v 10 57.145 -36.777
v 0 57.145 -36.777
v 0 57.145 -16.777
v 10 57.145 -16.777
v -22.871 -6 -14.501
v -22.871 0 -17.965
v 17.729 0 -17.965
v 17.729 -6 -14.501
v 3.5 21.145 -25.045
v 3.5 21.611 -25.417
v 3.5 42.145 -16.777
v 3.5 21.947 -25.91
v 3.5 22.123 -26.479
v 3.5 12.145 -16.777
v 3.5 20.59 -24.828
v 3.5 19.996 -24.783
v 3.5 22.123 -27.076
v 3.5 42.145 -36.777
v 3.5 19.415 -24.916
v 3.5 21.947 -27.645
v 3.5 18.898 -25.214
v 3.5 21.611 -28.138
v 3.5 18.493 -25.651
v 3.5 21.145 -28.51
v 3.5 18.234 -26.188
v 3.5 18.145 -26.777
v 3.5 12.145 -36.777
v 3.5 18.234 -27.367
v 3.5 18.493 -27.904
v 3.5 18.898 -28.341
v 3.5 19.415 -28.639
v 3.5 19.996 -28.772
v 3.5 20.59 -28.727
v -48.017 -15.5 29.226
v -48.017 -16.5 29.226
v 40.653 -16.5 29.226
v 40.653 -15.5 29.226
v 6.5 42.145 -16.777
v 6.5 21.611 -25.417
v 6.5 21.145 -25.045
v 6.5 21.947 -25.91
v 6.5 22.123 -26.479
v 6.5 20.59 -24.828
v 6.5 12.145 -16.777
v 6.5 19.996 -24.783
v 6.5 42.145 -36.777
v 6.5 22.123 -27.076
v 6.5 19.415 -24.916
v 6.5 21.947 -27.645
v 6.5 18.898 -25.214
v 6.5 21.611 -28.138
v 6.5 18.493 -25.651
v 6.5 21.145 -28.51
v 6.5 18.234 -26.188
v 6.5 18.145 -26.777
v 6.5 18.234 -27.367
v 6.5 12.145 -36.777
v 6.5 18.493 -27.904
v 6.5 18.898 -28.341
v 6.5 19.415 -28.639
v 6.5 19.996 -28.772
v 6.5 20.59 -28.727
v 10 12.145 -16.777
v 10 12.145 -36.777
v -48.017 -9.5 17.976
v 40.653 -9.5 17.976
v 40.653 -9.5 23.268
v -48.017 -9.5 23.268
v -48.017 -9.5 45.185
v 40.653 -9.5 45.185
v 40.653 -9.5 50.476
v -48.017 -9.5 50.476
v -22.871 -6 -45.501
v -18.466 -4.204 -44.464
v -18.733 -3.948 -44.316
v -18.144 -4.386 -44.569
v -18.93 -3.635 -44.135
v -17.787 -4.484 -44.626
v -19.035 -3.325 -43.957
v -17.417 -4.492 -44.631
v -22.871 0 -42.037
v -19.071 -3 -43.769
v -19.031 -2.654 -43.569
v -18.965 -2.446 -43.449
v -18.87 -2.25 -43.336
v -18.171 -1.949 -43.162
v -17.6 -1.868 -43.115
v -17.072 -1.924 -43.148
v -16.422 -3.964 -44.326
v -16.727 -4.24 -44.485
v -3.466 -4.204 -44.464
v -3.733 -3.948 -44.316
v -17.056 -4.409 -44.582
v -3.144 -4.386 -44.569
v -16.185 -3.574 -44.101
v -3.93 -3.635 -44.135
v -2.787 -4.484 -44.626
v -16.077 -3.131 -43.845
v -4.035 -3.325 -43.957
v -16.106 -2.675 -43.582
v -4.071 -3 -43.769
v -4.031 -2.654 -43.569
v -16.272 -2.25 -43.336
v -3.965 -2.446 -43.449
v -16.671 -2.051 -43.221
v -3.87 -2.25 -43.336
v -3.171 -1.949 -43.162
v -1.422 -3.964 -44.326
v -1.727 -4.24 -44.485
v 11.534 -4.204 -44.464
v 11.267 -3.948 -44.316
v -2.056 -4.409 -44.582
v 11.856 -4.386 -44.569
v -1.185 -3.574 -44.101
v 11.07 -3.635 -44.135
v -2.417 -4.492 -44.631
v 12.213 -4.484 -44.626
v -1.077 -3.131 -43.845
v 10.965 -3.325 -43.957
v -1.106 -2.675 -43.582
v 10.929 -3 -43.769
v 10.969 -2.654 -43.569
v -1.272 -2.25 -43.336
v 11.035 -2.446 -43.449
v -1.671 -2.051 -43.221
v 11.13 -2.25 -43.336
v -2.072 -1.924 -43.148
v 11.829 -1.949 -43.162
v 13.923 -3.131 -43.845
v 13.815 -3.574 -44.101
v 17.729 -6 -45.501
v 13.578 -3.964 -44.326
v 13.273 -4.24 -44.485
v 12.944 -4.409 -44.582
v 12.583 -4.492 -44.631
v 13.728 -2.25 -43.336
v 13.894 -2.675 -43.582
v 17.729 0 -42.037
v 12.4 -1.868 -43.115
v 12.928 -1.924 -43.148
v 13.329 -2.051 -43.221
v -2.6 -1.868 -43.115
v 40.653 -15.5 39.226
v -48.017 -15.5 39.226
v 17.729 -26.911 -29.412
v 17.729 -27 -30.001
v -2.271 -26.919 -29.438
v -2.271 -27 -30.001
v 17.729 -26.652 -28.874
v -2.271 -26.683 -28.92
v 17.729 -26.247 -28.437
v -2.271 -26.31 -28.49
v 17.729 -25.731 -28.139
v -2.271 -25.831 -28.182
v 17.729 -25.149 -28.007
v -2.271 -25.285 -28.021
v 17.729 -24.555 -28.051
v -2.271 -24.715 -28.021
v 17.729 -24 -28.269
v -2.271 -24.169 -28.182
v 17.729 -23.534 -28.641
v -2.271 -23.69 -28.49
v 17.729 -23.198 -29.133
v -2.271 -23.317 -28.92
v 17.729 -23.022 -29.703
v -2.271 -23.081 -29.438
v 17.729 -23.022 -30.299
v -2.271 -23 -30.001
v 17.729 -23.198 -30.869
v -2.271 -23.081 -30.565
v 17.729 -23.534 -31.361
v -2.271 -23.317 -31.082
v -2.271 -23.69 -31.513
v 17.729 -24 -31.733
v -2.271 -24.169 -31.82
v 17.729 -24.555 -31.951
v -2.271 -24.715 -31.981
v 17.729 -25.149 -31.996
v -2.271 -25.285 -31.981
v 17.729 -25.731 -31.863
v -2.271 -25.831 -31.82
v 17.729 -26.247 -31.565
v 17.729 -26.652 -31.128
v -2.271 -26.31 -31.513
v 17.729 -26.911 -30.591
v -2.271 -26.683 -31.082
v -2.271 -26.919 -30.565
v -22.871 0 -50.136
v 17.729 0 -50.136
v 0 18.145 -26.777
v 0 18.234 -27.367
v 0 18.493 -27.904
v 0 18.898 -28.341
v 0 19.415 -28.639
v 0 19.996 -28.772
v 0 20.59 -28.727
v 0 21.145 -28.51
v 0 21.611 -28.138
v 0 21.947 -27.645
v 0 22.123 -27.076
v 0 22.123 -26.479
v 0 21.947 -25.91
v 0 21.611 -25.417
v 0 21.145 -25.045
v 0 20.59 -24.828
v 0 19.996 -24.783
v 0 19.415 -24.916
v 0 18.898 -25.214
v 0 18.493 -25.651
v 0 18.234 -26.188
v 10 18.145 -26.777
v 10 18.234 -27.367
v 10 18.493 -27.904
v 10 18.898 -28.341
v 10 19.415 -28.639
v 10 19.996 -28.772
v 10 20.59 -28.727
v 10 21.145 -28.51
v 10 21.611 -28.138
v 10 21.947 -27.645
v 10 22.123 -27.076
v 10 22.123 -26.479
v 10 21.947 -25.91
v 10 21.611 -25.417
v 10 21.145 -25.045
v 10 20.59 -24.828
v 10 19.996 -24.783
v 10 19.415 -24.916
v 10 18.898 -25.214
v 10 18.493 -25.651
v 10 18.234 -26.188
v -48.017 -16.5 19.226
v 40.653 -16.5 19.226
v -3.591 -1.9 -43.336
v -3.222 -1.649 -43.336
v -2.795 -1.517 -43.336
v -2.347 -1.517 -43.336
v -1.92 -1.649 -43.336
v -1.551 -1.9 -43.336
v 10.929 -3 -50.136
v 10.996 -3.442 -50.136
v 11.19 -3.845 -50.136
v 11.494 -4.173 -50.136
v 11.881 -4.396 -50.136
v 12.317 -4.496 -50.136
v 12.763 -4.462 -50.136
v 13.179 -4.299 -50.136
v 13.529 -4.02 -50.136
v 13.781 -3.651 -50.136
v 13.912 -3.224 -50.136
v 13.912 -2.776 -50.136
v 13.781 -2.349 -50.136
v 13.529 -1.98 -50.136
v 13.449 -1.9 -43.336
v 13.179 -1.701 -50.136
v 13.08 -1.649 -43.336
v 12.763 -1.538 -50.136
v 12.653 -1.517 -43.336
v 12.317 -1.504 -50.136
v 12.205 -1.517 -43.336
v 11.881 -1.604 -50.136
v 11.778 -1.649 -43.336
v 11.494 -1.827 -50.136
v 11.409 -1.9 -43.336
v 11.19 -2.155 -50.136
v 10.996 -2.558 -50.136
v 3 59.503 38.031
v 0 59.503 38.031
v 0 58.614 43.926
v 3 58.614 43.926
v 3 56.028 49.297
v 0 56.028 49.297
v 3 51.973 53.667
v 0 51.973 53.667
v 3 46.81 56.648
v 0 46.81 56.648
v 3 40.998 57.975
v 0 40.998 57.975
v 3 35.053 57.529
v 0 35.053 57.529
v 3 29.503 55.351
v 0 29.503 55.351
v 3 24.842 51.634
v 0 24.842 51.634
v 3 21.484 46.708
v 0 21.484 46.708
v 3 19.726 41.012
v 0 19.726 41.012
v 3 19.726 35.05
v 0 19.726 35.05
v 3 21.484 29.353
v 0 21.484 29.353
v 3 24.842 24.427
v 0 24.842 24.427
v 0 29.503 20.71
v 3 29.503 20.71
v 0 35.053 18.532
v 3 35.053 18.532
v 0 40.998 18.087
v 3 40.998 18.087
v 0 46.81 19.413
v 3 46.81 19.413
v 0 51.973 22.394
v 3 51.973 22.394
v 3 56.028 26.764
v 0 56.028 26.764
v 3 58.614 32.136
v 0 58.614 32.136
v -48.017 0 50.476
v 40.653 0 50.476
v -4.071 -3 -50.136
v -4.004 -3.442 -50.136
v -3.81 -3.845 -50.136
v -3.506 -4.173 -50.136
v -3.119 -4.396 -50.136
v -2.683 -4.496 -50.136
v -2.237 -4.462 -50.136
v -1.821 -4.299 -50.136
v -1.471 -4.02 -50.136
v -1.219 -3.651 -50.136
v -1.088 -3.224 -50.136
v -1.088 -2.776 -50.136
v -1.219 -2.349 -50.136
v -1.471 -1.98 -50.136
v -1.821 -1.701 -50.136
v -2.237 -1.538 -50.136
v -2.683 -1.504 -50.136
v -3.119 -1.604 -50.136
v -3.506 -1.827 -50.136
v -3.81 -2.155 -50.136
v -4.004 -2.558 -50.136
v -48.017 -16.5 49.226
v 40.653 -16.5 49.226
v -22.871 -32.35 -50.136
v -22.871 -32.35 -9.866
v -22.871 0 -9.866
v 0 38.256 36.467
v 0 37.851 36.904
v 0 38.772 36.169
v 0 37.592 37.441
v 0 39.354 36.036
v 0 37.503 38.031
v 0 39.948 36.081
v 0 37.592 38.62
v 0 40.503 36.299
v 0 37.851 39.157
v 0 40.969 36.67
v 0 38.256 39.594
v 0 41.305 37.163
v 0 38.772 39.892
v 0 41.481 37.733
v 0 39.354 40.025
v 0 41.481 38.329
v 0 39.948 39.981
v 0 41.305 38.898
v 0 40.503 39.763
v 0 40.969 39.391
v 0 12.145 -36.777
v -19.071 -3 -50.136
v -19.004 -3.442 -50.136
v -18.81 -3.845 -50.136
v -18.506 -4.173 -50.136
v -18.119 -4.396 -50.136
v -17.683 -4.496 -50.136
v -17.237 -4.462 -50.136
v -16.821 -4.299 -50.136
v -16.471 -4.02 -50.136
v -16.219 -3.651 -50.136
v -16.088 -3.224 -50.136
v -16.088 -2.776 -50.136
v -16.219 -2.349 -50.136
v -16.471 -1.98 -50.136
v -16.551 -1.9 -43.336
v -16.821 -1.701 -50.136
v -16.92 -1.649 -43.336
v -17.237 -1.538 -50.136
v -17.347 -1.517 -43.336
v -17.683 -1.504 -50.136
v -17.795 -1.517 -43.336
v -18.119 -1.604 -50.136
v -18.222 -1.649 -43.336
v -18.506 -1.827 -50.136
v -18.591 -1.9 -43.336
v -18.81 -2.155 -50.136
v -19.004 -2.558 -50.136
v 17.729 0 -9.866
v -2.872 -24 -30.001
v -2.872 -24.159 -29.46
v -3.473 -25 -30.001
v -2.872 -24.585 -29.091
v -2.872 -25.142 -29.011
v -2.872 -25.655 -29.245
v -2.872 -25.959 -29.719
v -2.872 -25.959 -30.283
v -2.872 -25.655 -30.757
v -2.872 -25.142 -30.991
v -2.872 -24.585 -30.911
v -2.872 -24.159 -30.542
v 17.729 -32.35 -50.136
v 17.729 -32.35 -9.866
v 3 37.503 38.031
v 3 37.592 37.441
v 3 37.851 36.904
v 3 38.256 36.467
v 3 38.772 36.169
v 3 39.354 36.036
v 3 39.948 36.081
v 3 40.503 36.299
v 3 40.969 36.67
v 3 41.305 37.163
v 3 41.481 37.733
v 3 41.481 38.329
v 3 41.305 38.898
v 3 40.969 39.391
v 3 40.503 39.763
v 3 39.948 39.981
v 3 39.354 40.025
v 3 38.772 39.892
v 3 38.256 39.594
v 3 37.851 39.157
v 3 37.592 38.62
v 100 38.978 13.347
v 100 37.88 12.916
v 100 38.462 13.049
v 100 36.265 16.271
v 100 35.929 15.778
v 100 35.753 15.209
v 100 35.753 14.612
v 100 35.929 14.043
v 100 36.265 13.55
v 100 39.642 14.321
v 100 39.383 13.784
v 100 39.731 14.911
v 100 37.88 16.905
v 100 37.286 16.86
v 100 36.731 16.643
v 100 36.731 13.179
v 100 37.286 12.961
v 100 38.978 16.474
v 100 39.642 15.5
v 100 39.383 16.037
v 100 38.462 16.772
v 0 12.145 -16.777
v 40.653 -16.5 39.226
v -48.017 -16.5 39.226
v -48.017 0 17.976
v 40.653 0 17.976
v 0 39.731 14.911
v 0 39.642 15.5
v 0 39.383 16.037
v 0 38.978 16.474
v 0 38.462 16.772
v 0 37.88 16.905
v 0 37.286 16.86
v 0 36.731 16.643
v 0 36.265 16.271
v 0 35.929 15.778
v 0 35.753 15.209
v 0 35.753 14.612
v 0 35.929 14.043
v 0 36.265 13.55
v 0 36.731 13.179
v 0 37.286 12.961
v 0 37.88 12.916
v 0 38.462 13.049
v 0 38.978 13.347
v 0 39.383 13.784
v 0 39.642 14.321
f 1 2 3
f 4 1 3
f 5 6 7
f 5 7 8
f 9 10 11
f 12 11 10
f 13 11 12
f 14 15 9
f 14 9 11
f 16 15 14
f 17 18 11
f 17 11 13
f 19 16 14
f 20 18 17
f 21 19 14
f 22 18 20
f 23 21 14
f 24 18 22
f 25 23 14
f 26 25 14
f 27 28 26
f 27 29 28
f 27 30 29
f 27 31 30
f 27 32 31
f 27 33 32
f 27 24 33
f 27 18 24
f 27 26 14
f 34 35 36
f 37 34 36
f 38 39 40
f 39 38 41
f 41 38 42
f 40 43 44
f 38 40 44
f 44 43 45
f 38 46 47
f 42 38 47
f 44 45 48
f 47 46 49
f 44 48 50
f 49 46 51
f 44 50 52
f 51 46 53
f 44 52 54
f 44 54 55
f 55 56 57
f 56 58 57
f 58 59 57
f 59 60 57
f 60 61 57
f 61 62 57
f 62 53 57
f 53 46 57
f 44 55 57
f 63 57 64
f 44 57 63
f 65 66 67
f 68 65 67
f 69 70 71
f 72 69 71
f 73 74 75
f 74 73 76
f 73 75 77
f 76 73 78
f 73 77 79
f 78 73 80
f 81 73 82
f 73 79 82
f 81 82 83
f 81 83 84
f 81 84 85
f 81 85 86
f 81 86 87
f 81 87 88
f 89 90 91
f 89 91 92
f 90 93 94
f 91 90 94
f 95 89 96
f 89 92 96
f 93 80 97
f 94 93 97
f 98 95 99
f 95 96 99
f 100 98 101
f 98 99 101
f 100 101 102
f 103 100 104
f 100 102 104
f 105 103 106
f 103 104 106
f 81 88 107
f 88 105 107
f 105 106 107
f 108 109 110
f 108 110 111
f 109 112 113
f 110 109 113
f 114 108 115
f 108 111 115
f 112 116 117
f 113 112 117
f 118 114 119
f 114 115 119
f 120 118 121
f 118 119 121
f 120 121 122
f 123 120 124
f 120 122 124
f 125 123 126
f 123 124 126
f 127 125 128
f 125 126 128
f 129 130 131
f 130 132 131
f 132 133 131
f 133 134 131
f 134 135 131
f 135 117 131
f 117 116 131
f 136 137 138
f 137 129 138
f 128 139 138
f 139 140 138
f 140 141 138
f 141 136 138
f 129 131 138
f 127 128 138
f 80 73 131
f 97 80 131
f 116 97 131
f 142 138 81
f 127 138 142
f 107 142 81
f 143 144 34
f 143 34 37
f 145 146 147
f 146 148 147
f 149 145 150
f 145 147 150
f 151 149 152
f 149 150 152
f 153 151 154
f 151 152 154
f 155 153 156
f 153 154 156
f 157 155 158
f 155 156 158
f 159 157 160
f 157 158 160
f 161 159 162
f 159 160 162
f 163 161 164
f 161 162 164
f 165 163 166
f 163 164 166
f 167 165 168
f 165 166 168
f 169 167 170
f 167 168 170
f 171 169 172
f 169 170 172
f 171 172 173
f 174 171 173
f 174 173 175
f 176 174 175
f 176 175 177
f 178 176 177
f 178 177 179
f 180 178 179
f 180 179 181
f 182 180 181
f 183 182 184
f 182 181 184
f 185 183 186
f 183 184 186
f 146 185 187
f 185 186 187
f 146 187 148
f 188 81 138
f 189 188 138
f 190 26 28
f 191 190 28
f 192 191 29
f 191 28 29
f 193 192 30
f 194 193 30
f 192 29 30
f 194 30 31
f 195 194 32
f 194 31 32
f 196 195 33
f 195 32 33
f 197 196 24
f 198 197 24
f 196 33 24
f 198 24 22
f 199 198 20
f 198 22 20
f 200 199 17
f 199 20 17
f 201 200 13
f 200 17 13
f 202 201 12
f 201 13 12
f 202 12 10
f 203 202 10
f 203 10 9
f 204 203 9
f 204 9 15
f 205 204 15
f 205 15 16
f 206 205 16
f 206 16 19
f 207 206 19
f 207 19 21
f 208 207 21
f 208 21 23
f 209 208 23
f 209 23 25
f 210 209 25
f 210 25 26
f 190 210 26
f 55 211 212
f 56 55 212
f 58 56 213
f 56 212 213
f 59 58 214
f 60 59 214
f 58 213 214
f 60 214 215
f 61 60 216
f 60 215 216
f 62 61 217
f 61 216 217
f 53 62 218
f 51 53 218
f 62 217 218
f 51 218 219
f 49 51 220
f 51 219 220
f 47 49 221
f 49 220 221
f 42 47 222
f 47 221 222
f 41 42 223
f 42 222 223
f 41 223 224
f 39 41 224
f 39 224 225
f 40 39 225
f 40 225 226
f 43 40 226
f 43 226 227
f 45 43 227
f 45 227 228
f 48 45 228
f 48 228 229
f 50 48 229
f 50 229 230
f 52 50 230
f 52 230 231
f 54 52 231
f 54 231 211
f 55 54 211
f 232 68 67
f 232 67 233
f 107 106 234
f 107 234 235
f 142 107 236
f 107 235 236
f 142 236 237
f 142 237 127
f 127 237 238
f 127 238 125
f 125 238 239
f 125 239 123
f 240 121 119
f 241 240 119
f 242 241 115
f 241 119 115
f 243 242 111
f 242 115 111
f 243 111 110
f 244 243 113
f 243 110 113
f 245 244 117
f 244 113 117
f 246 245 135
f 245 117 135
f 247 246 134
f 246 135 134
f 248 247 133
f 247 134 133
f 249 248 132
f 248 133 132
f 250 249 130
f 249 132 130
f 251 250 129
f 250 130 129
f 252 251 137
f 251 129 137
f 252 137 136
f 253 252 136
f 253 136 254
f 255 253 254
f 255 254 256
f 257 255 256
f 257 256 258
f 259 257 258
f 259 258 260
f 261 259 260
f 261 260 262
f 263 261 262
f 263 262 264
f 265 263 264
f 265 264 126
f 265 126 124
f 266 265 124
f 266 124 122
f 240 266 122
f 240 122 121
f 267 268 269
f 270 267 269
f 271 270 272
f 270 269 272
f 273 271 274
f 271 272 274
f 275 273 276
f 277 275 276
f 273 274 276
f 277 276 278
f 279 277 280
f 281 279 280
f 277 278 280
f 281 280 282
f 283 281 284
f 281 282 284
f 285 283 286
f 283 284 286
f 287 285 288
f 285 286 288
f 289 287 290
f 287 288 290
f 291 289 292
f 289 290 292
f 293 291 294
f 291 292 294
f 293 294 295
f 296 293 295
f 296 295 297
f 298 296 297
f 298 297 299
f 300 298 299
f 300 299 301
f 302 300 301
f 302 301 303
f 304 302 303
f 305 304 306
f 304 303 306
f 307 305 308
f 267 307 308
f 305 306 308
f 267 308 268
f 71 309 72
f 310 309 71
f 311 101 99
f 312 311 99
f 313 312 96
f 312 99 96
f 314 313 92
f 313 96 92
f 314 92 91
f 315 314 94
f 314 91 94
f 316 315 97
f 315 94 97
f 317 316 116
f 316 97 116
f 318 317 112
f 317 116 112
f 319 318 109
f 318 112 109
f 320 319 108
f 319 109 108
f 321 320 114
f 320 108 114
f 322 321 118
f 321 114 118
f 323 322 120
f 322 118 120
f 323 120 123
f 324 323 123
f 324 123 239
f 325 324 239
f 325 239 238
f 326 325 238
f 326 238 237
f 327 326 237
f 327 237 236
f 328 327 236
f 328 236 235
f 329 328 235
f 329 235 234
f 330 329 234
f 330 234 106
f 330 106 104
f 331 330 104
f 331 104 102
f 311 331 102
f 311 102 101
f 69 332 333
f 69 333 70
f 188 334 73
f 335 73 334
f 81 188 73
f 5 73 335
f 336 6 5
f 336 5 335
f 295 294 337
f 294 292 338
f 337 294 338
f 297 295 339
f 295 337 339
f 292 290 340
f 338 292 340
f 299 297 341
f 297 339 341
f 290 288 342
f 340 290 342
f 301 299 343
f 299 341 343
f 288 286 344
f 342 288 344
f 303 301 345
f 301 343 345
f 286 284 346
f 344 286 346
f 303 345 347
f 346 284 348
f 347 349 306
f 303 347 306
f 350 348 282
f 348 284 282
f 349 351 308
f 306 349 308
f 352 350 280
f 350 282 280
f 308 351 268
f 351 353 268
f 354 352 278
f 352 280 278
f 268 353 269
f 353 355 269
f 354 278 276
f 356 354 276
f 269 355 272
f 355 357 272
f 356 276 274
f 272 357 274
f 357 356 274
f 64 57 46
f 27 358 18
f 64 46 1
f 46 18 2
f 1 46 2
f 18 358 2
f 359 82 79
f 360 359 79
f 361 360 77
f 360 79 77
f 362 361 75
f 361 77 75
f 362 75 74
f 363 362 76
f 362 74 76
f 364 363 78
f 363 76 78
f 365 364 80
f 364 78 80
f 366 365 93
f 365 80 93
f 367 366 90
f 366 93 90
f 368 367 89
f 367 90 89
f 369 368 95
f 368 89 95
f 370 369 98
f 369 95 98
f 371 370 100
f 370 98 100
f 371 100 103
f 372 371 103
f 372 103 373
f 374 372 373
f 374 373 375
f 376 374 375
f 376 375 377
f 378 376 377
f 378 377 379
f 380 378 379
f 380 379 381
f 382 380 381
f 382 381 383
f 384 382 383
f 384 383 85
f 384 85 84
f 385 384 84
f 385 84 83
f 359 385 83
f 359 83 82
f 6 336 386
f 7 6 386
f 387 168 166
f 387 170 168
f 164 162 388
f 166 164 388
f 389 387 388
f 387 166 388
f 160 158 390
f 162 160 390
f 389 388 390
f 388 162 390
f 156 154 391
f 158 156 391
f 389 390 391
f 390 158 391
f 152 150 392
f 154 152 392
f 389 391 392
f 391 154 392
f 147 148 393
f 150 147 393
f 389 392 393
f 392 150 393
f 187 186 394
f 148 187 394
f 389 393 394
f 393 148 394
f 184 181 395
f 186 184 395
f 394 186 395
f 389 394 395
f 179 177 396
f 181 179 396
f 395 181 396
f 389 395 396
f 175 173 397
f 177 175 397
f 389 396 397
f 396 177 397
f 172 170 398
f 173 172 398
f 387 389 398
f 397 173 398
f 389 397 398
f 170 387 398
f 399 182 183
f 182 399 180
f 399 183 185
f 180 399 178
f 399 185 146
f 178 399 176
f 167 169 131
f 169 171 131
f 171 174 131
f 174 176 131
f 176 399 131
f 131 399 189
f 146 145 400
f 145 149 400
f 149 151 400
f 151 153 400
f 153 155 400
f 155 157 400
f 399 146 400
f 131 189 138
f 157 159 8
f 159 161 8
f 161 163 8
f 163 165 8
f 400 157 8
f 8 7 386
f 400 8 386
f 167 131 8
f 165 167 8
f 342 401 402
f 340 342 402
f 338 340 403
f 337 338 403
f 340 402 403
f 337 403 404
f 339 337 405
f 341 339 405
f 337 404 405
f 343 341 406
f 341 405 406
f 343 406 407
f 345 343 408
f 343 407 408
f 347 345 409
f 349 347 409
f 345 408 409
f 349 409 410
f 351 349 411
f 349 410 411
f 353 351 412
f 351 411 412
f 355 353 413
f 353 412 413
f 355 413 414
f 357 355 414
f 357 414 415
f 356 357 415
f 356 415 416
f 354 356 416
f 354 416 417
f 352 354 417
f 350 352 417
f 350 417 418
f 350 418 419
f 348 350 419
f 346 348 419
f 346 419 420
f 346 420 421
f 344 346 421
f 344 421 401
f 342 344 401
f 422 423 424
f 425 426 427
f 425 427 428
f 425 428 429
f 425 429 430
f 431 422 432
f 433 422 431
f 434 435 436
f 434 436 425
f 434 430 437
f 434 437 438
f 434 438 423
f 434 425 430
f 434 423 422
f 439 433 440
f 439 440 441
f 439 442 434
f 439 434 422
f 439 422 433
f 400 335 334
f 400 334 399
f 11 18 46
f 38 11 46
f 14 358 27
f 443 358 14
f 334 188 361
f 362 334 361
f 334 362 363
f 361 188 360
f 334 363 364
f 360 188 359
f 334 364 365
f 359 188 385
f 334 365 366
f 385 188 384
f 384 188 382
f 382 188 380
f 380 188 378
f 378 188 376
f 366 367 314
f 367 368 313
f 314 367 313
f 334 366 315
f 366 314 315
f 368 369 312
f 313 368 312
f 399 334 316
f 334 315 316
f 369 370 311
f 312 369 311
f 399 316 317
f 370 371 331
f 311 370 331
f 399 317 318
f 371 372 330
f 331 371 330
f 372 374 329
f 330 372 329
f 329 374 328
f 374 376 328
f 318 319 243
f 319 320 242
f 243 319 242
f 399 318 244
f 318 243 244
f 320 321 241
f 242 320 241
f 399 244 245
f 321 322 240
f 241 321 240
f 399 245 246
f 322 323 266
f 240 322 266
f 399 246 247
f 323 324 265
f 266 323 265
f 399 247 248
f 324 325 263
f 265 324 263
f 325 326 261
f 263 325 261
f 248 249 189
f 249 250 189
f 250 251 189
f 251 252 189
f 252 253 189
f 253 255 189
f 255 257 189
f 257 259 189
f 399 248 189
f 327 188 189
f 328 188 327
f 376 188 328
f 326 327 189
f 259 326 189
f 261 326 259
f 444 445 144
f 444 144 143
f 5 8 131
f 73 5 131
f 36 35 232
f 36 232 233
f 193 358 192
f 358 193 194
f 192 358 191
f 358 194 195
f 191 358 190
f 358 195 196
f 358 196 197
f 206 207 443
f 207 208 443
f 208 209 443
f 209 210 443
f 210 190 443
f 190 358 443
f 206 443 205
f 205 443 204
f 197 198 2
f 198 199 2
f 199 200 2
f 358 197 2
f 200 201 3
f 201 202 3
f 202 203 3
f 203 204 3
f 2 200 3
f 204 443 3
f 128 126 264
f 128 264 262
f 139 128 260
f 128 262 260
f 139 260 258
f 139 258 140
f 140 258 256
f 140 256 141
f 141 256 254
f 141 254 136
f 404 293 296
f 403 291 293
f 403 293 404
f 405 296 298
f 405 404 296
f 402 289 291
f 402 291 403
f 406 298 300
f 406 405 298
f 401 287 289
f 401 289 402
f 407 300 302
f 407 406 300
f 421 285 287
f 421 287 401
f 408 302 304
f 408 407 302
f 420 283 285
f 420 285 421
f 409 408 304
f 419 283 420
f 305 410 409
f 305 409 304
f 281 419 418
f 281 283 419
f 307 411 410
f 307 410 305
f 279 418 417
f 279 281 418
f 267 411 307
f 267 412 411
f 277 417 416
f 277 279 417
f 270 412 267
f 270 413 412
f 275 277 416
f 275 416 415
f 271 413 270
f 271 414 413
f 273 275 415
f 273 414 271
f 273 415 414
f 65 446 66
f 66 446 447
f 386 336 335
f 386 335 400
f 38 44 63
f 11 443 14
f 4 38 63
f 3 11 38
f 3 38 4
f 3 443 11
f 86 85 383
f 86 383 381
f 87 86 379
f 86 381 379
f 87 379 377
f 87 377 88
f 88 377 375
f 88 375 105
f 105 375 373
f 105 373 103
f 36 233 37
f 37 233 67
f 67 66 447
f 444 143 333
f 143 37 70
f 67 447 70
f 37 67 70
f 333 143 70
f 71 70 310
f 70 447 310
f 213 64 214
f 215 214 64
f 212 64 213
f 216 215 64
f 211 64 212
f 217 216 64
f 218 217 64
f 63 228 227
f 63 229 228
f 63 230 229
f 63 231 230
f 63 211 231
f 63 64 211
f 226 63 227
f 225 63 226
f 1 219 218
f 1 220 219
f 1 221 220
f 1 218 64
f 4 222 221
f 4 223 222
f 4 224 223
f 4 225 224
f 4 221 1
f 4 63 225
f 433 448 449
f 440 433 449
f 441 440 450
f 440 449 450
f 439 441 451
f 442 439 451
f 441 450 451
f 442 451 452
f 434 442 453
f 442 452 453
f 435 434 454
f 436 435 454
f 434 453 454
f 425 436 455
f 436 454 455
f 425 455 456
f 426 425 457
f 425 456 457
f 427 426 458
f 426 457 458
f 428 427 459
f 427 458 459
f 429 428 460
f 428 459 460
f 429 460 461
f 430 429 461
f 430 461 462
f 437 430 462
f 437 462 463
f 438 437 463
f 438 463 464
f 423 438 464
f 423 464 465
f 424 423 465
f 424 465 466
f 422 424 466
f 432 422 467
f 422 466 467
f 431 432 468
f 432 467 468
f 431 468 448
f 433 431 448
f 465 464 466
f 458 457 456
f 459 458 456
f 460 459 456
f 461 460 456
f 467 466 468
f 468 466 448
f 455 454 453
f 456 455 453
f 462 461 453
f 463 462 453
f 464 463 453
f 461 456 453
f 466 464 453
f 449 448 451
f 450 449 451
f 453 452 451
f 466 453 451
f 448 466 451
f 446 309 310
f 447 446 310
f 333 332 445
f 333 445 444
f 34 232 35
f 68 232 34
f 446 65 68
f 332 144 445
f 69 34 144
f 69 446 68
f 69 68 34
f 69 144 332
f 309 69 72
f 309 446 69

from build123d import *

# Parameters (mm, degrees)
F0_W      = 88.67
F0_H      = 32.5
F1_DEPTH  = 16.5
F2_W      = 40.6
F2_H      = 40.27
F3_DEPTH  = 32.35
F5_DEPTH  = 40.6
F7_DEPTH  = 88.67
F8_W      = 88.67
F8_H      = 10
F9_DEPTH  = 1
F11_D     = 3
F11_DEPTH = 6.8
F11_TIP   = 0.9012909285
F12_D     = 4
F12_DEPTH = 20
F12_TIP   = 1.2017212381
F13_W     = 45
F13_H     = 20
F14_DEPTH = 10
F15_W     = 3
F15_H     = 30
F16_DEPTH = 20
F17_D     = 4
F18_R     = 2
F19_DEPTH = 100
F20_R     = 20
F21_DEPTH = 3
F22_D     = 4


with BuildPart() as f1:
    # F0 (on Front) → F1 (new body)
    with BuildSketch(Plane.XZ):
        with Locations((-3.6818569219, 34.2264404893)):
            Rectangle(F0_W, F0_H)
    extrude(amount=F1_DEPTH)

    # F6 (on face) → F7 (cut, through all)
    with BuildSketch(Plane.YZ.offset(40.6531430781)):
        Polygon((-16.5, 50.4764404893), (-16.5, 49.2264404893), (-9.5, 45.184988605), (-9.5, 50.4764404893), align=None)
        Polygon((-9.5, 23.2678923736), (-16.5, 19.2264404893), (-16.5, 17.9764404893), (-9.5, 17.9764404893), align=None)
    extrude(amount=-F7_DEPTH, mode=Mode.SUBTRACT)

    # F8 (on face) → F9 (cut)
    with BuildSketch(Plane.XZ.offset(16.5)):
        with Locations((-3.6818569219, 34.2264404893)):
            Rectangle(F8_W, F8_H)
    extrude(amount=-F9_DEPTH, mode=Mode.SUBTRACT)


with BuildPart() as f3:
    # F2 (on Front) → F3 (new body)
    with BuildSketch(Plane.XZ):
        with Locations((-2.5709411383, -30.0011265779)):
            Rectangle(F2_W, F2_H)
    extrude(amount=F3_DEPTH)

    # F4 (on face) → F5 (cut, through all)
    with BuildSketch(Plane.YZ.offset(17.7290588617)):
        Polygon((0, -42.0370249627), (0, -17.965228193), (-6, -14.5011265779), (-6, -45.5011265779), align=None)
    extrude(amount=-F5_DEPTH, mode=Mode.SUBTRACT)

    # F11
    with Locations(Plane(origin=(0, 0, -50.1361265779), x_dir=(1, 0, 0), z_dir=(0, 0, -1))):
        with Locations((-2.5709411383, 3), (12.4290588617, 3), (-17.5709411383, 3)):
            Hole(F11_D / 2, depth=F11_DEPTH)
            with Locations((0, 0, -(F11_DEPTH + F11_TIP / 2))):  # 118° drill point
                Cone(0, F11_D / 2, F11_TIP, mode=Mode.SUBTRACT)

    # F12
    with Locations(Plane.YZ.offset(17.7290588617)):
        with Locations((-25, -30.0011265779)):
            Hole(F12_D / 2, depth=F12_DEPTH)
            with Locations((0, 0, -(F12_DEPTH + F12_TIP / 2))):  # 118° drill point
                Cone(0, F12_D / 2, F12_TIP, mode=Mode.SUBTRACT)


with BuildPart() as f14:
    # F13 (on Right) → F14 (new body)
    with BuildSketch(Plane.YZ):
        with Locations((34.6452900767, -26.7774888873)):
            Rectangle(F13_W, F13_H)
    extrude(amount=F14_DEPTH)

    # F15 (on face) → F16 (cut, through all)
    with BuildSketch(Plane(origin=(0, 0, -36.7774888873), x_dir=(1, 0, 0), z_dir=(0, 0, -1))):
        with Locations((5, -27.1452900767)):
            Rectangle(F15_W, F15_H)
    extrude(amount=-F16_DEPTH, mode=Mode.SUBTRACT)

    # F17 (through all)
    with Locations(Plane(origin=(0, 0, 0), x_dir=(0, 1, 0), z_dir=(-1, 0, 0))):
        with Locations((20.1452900767, 26.7774888873)):
            Hole(F17_D / 2)


with BuildPart() as f19:
    # F18 (on Right) → F19 (new body)
    with BuildSketch(Plane.YZ):
        with Locations((37.7309694886, 14.9105554447)):
            Circle(F18_R)
    extrude(amount=F19_DEPTH)


with BuildPart() as f21:
    # F20 (on Right) → F21 (new body)
    with BuildSketch(Plane.YZ):
        with Locations((39.5030267537, 38.0307175219)):
            Circle(F20_R)
    extrude(amount=F21_DEPTH)

    # F22 (through all)
    with Locations(Plane(origin=(0, 0, 0), x_dir=(0, 1, 0), z_dir=(-1, 0, 0))):
        with Locations((39.5030267537, -38.0307175219)):
            Hole(F22_D / 2)


solid = Compound([f1.part, f3.part, f14.part, f19.part, f21.part])
